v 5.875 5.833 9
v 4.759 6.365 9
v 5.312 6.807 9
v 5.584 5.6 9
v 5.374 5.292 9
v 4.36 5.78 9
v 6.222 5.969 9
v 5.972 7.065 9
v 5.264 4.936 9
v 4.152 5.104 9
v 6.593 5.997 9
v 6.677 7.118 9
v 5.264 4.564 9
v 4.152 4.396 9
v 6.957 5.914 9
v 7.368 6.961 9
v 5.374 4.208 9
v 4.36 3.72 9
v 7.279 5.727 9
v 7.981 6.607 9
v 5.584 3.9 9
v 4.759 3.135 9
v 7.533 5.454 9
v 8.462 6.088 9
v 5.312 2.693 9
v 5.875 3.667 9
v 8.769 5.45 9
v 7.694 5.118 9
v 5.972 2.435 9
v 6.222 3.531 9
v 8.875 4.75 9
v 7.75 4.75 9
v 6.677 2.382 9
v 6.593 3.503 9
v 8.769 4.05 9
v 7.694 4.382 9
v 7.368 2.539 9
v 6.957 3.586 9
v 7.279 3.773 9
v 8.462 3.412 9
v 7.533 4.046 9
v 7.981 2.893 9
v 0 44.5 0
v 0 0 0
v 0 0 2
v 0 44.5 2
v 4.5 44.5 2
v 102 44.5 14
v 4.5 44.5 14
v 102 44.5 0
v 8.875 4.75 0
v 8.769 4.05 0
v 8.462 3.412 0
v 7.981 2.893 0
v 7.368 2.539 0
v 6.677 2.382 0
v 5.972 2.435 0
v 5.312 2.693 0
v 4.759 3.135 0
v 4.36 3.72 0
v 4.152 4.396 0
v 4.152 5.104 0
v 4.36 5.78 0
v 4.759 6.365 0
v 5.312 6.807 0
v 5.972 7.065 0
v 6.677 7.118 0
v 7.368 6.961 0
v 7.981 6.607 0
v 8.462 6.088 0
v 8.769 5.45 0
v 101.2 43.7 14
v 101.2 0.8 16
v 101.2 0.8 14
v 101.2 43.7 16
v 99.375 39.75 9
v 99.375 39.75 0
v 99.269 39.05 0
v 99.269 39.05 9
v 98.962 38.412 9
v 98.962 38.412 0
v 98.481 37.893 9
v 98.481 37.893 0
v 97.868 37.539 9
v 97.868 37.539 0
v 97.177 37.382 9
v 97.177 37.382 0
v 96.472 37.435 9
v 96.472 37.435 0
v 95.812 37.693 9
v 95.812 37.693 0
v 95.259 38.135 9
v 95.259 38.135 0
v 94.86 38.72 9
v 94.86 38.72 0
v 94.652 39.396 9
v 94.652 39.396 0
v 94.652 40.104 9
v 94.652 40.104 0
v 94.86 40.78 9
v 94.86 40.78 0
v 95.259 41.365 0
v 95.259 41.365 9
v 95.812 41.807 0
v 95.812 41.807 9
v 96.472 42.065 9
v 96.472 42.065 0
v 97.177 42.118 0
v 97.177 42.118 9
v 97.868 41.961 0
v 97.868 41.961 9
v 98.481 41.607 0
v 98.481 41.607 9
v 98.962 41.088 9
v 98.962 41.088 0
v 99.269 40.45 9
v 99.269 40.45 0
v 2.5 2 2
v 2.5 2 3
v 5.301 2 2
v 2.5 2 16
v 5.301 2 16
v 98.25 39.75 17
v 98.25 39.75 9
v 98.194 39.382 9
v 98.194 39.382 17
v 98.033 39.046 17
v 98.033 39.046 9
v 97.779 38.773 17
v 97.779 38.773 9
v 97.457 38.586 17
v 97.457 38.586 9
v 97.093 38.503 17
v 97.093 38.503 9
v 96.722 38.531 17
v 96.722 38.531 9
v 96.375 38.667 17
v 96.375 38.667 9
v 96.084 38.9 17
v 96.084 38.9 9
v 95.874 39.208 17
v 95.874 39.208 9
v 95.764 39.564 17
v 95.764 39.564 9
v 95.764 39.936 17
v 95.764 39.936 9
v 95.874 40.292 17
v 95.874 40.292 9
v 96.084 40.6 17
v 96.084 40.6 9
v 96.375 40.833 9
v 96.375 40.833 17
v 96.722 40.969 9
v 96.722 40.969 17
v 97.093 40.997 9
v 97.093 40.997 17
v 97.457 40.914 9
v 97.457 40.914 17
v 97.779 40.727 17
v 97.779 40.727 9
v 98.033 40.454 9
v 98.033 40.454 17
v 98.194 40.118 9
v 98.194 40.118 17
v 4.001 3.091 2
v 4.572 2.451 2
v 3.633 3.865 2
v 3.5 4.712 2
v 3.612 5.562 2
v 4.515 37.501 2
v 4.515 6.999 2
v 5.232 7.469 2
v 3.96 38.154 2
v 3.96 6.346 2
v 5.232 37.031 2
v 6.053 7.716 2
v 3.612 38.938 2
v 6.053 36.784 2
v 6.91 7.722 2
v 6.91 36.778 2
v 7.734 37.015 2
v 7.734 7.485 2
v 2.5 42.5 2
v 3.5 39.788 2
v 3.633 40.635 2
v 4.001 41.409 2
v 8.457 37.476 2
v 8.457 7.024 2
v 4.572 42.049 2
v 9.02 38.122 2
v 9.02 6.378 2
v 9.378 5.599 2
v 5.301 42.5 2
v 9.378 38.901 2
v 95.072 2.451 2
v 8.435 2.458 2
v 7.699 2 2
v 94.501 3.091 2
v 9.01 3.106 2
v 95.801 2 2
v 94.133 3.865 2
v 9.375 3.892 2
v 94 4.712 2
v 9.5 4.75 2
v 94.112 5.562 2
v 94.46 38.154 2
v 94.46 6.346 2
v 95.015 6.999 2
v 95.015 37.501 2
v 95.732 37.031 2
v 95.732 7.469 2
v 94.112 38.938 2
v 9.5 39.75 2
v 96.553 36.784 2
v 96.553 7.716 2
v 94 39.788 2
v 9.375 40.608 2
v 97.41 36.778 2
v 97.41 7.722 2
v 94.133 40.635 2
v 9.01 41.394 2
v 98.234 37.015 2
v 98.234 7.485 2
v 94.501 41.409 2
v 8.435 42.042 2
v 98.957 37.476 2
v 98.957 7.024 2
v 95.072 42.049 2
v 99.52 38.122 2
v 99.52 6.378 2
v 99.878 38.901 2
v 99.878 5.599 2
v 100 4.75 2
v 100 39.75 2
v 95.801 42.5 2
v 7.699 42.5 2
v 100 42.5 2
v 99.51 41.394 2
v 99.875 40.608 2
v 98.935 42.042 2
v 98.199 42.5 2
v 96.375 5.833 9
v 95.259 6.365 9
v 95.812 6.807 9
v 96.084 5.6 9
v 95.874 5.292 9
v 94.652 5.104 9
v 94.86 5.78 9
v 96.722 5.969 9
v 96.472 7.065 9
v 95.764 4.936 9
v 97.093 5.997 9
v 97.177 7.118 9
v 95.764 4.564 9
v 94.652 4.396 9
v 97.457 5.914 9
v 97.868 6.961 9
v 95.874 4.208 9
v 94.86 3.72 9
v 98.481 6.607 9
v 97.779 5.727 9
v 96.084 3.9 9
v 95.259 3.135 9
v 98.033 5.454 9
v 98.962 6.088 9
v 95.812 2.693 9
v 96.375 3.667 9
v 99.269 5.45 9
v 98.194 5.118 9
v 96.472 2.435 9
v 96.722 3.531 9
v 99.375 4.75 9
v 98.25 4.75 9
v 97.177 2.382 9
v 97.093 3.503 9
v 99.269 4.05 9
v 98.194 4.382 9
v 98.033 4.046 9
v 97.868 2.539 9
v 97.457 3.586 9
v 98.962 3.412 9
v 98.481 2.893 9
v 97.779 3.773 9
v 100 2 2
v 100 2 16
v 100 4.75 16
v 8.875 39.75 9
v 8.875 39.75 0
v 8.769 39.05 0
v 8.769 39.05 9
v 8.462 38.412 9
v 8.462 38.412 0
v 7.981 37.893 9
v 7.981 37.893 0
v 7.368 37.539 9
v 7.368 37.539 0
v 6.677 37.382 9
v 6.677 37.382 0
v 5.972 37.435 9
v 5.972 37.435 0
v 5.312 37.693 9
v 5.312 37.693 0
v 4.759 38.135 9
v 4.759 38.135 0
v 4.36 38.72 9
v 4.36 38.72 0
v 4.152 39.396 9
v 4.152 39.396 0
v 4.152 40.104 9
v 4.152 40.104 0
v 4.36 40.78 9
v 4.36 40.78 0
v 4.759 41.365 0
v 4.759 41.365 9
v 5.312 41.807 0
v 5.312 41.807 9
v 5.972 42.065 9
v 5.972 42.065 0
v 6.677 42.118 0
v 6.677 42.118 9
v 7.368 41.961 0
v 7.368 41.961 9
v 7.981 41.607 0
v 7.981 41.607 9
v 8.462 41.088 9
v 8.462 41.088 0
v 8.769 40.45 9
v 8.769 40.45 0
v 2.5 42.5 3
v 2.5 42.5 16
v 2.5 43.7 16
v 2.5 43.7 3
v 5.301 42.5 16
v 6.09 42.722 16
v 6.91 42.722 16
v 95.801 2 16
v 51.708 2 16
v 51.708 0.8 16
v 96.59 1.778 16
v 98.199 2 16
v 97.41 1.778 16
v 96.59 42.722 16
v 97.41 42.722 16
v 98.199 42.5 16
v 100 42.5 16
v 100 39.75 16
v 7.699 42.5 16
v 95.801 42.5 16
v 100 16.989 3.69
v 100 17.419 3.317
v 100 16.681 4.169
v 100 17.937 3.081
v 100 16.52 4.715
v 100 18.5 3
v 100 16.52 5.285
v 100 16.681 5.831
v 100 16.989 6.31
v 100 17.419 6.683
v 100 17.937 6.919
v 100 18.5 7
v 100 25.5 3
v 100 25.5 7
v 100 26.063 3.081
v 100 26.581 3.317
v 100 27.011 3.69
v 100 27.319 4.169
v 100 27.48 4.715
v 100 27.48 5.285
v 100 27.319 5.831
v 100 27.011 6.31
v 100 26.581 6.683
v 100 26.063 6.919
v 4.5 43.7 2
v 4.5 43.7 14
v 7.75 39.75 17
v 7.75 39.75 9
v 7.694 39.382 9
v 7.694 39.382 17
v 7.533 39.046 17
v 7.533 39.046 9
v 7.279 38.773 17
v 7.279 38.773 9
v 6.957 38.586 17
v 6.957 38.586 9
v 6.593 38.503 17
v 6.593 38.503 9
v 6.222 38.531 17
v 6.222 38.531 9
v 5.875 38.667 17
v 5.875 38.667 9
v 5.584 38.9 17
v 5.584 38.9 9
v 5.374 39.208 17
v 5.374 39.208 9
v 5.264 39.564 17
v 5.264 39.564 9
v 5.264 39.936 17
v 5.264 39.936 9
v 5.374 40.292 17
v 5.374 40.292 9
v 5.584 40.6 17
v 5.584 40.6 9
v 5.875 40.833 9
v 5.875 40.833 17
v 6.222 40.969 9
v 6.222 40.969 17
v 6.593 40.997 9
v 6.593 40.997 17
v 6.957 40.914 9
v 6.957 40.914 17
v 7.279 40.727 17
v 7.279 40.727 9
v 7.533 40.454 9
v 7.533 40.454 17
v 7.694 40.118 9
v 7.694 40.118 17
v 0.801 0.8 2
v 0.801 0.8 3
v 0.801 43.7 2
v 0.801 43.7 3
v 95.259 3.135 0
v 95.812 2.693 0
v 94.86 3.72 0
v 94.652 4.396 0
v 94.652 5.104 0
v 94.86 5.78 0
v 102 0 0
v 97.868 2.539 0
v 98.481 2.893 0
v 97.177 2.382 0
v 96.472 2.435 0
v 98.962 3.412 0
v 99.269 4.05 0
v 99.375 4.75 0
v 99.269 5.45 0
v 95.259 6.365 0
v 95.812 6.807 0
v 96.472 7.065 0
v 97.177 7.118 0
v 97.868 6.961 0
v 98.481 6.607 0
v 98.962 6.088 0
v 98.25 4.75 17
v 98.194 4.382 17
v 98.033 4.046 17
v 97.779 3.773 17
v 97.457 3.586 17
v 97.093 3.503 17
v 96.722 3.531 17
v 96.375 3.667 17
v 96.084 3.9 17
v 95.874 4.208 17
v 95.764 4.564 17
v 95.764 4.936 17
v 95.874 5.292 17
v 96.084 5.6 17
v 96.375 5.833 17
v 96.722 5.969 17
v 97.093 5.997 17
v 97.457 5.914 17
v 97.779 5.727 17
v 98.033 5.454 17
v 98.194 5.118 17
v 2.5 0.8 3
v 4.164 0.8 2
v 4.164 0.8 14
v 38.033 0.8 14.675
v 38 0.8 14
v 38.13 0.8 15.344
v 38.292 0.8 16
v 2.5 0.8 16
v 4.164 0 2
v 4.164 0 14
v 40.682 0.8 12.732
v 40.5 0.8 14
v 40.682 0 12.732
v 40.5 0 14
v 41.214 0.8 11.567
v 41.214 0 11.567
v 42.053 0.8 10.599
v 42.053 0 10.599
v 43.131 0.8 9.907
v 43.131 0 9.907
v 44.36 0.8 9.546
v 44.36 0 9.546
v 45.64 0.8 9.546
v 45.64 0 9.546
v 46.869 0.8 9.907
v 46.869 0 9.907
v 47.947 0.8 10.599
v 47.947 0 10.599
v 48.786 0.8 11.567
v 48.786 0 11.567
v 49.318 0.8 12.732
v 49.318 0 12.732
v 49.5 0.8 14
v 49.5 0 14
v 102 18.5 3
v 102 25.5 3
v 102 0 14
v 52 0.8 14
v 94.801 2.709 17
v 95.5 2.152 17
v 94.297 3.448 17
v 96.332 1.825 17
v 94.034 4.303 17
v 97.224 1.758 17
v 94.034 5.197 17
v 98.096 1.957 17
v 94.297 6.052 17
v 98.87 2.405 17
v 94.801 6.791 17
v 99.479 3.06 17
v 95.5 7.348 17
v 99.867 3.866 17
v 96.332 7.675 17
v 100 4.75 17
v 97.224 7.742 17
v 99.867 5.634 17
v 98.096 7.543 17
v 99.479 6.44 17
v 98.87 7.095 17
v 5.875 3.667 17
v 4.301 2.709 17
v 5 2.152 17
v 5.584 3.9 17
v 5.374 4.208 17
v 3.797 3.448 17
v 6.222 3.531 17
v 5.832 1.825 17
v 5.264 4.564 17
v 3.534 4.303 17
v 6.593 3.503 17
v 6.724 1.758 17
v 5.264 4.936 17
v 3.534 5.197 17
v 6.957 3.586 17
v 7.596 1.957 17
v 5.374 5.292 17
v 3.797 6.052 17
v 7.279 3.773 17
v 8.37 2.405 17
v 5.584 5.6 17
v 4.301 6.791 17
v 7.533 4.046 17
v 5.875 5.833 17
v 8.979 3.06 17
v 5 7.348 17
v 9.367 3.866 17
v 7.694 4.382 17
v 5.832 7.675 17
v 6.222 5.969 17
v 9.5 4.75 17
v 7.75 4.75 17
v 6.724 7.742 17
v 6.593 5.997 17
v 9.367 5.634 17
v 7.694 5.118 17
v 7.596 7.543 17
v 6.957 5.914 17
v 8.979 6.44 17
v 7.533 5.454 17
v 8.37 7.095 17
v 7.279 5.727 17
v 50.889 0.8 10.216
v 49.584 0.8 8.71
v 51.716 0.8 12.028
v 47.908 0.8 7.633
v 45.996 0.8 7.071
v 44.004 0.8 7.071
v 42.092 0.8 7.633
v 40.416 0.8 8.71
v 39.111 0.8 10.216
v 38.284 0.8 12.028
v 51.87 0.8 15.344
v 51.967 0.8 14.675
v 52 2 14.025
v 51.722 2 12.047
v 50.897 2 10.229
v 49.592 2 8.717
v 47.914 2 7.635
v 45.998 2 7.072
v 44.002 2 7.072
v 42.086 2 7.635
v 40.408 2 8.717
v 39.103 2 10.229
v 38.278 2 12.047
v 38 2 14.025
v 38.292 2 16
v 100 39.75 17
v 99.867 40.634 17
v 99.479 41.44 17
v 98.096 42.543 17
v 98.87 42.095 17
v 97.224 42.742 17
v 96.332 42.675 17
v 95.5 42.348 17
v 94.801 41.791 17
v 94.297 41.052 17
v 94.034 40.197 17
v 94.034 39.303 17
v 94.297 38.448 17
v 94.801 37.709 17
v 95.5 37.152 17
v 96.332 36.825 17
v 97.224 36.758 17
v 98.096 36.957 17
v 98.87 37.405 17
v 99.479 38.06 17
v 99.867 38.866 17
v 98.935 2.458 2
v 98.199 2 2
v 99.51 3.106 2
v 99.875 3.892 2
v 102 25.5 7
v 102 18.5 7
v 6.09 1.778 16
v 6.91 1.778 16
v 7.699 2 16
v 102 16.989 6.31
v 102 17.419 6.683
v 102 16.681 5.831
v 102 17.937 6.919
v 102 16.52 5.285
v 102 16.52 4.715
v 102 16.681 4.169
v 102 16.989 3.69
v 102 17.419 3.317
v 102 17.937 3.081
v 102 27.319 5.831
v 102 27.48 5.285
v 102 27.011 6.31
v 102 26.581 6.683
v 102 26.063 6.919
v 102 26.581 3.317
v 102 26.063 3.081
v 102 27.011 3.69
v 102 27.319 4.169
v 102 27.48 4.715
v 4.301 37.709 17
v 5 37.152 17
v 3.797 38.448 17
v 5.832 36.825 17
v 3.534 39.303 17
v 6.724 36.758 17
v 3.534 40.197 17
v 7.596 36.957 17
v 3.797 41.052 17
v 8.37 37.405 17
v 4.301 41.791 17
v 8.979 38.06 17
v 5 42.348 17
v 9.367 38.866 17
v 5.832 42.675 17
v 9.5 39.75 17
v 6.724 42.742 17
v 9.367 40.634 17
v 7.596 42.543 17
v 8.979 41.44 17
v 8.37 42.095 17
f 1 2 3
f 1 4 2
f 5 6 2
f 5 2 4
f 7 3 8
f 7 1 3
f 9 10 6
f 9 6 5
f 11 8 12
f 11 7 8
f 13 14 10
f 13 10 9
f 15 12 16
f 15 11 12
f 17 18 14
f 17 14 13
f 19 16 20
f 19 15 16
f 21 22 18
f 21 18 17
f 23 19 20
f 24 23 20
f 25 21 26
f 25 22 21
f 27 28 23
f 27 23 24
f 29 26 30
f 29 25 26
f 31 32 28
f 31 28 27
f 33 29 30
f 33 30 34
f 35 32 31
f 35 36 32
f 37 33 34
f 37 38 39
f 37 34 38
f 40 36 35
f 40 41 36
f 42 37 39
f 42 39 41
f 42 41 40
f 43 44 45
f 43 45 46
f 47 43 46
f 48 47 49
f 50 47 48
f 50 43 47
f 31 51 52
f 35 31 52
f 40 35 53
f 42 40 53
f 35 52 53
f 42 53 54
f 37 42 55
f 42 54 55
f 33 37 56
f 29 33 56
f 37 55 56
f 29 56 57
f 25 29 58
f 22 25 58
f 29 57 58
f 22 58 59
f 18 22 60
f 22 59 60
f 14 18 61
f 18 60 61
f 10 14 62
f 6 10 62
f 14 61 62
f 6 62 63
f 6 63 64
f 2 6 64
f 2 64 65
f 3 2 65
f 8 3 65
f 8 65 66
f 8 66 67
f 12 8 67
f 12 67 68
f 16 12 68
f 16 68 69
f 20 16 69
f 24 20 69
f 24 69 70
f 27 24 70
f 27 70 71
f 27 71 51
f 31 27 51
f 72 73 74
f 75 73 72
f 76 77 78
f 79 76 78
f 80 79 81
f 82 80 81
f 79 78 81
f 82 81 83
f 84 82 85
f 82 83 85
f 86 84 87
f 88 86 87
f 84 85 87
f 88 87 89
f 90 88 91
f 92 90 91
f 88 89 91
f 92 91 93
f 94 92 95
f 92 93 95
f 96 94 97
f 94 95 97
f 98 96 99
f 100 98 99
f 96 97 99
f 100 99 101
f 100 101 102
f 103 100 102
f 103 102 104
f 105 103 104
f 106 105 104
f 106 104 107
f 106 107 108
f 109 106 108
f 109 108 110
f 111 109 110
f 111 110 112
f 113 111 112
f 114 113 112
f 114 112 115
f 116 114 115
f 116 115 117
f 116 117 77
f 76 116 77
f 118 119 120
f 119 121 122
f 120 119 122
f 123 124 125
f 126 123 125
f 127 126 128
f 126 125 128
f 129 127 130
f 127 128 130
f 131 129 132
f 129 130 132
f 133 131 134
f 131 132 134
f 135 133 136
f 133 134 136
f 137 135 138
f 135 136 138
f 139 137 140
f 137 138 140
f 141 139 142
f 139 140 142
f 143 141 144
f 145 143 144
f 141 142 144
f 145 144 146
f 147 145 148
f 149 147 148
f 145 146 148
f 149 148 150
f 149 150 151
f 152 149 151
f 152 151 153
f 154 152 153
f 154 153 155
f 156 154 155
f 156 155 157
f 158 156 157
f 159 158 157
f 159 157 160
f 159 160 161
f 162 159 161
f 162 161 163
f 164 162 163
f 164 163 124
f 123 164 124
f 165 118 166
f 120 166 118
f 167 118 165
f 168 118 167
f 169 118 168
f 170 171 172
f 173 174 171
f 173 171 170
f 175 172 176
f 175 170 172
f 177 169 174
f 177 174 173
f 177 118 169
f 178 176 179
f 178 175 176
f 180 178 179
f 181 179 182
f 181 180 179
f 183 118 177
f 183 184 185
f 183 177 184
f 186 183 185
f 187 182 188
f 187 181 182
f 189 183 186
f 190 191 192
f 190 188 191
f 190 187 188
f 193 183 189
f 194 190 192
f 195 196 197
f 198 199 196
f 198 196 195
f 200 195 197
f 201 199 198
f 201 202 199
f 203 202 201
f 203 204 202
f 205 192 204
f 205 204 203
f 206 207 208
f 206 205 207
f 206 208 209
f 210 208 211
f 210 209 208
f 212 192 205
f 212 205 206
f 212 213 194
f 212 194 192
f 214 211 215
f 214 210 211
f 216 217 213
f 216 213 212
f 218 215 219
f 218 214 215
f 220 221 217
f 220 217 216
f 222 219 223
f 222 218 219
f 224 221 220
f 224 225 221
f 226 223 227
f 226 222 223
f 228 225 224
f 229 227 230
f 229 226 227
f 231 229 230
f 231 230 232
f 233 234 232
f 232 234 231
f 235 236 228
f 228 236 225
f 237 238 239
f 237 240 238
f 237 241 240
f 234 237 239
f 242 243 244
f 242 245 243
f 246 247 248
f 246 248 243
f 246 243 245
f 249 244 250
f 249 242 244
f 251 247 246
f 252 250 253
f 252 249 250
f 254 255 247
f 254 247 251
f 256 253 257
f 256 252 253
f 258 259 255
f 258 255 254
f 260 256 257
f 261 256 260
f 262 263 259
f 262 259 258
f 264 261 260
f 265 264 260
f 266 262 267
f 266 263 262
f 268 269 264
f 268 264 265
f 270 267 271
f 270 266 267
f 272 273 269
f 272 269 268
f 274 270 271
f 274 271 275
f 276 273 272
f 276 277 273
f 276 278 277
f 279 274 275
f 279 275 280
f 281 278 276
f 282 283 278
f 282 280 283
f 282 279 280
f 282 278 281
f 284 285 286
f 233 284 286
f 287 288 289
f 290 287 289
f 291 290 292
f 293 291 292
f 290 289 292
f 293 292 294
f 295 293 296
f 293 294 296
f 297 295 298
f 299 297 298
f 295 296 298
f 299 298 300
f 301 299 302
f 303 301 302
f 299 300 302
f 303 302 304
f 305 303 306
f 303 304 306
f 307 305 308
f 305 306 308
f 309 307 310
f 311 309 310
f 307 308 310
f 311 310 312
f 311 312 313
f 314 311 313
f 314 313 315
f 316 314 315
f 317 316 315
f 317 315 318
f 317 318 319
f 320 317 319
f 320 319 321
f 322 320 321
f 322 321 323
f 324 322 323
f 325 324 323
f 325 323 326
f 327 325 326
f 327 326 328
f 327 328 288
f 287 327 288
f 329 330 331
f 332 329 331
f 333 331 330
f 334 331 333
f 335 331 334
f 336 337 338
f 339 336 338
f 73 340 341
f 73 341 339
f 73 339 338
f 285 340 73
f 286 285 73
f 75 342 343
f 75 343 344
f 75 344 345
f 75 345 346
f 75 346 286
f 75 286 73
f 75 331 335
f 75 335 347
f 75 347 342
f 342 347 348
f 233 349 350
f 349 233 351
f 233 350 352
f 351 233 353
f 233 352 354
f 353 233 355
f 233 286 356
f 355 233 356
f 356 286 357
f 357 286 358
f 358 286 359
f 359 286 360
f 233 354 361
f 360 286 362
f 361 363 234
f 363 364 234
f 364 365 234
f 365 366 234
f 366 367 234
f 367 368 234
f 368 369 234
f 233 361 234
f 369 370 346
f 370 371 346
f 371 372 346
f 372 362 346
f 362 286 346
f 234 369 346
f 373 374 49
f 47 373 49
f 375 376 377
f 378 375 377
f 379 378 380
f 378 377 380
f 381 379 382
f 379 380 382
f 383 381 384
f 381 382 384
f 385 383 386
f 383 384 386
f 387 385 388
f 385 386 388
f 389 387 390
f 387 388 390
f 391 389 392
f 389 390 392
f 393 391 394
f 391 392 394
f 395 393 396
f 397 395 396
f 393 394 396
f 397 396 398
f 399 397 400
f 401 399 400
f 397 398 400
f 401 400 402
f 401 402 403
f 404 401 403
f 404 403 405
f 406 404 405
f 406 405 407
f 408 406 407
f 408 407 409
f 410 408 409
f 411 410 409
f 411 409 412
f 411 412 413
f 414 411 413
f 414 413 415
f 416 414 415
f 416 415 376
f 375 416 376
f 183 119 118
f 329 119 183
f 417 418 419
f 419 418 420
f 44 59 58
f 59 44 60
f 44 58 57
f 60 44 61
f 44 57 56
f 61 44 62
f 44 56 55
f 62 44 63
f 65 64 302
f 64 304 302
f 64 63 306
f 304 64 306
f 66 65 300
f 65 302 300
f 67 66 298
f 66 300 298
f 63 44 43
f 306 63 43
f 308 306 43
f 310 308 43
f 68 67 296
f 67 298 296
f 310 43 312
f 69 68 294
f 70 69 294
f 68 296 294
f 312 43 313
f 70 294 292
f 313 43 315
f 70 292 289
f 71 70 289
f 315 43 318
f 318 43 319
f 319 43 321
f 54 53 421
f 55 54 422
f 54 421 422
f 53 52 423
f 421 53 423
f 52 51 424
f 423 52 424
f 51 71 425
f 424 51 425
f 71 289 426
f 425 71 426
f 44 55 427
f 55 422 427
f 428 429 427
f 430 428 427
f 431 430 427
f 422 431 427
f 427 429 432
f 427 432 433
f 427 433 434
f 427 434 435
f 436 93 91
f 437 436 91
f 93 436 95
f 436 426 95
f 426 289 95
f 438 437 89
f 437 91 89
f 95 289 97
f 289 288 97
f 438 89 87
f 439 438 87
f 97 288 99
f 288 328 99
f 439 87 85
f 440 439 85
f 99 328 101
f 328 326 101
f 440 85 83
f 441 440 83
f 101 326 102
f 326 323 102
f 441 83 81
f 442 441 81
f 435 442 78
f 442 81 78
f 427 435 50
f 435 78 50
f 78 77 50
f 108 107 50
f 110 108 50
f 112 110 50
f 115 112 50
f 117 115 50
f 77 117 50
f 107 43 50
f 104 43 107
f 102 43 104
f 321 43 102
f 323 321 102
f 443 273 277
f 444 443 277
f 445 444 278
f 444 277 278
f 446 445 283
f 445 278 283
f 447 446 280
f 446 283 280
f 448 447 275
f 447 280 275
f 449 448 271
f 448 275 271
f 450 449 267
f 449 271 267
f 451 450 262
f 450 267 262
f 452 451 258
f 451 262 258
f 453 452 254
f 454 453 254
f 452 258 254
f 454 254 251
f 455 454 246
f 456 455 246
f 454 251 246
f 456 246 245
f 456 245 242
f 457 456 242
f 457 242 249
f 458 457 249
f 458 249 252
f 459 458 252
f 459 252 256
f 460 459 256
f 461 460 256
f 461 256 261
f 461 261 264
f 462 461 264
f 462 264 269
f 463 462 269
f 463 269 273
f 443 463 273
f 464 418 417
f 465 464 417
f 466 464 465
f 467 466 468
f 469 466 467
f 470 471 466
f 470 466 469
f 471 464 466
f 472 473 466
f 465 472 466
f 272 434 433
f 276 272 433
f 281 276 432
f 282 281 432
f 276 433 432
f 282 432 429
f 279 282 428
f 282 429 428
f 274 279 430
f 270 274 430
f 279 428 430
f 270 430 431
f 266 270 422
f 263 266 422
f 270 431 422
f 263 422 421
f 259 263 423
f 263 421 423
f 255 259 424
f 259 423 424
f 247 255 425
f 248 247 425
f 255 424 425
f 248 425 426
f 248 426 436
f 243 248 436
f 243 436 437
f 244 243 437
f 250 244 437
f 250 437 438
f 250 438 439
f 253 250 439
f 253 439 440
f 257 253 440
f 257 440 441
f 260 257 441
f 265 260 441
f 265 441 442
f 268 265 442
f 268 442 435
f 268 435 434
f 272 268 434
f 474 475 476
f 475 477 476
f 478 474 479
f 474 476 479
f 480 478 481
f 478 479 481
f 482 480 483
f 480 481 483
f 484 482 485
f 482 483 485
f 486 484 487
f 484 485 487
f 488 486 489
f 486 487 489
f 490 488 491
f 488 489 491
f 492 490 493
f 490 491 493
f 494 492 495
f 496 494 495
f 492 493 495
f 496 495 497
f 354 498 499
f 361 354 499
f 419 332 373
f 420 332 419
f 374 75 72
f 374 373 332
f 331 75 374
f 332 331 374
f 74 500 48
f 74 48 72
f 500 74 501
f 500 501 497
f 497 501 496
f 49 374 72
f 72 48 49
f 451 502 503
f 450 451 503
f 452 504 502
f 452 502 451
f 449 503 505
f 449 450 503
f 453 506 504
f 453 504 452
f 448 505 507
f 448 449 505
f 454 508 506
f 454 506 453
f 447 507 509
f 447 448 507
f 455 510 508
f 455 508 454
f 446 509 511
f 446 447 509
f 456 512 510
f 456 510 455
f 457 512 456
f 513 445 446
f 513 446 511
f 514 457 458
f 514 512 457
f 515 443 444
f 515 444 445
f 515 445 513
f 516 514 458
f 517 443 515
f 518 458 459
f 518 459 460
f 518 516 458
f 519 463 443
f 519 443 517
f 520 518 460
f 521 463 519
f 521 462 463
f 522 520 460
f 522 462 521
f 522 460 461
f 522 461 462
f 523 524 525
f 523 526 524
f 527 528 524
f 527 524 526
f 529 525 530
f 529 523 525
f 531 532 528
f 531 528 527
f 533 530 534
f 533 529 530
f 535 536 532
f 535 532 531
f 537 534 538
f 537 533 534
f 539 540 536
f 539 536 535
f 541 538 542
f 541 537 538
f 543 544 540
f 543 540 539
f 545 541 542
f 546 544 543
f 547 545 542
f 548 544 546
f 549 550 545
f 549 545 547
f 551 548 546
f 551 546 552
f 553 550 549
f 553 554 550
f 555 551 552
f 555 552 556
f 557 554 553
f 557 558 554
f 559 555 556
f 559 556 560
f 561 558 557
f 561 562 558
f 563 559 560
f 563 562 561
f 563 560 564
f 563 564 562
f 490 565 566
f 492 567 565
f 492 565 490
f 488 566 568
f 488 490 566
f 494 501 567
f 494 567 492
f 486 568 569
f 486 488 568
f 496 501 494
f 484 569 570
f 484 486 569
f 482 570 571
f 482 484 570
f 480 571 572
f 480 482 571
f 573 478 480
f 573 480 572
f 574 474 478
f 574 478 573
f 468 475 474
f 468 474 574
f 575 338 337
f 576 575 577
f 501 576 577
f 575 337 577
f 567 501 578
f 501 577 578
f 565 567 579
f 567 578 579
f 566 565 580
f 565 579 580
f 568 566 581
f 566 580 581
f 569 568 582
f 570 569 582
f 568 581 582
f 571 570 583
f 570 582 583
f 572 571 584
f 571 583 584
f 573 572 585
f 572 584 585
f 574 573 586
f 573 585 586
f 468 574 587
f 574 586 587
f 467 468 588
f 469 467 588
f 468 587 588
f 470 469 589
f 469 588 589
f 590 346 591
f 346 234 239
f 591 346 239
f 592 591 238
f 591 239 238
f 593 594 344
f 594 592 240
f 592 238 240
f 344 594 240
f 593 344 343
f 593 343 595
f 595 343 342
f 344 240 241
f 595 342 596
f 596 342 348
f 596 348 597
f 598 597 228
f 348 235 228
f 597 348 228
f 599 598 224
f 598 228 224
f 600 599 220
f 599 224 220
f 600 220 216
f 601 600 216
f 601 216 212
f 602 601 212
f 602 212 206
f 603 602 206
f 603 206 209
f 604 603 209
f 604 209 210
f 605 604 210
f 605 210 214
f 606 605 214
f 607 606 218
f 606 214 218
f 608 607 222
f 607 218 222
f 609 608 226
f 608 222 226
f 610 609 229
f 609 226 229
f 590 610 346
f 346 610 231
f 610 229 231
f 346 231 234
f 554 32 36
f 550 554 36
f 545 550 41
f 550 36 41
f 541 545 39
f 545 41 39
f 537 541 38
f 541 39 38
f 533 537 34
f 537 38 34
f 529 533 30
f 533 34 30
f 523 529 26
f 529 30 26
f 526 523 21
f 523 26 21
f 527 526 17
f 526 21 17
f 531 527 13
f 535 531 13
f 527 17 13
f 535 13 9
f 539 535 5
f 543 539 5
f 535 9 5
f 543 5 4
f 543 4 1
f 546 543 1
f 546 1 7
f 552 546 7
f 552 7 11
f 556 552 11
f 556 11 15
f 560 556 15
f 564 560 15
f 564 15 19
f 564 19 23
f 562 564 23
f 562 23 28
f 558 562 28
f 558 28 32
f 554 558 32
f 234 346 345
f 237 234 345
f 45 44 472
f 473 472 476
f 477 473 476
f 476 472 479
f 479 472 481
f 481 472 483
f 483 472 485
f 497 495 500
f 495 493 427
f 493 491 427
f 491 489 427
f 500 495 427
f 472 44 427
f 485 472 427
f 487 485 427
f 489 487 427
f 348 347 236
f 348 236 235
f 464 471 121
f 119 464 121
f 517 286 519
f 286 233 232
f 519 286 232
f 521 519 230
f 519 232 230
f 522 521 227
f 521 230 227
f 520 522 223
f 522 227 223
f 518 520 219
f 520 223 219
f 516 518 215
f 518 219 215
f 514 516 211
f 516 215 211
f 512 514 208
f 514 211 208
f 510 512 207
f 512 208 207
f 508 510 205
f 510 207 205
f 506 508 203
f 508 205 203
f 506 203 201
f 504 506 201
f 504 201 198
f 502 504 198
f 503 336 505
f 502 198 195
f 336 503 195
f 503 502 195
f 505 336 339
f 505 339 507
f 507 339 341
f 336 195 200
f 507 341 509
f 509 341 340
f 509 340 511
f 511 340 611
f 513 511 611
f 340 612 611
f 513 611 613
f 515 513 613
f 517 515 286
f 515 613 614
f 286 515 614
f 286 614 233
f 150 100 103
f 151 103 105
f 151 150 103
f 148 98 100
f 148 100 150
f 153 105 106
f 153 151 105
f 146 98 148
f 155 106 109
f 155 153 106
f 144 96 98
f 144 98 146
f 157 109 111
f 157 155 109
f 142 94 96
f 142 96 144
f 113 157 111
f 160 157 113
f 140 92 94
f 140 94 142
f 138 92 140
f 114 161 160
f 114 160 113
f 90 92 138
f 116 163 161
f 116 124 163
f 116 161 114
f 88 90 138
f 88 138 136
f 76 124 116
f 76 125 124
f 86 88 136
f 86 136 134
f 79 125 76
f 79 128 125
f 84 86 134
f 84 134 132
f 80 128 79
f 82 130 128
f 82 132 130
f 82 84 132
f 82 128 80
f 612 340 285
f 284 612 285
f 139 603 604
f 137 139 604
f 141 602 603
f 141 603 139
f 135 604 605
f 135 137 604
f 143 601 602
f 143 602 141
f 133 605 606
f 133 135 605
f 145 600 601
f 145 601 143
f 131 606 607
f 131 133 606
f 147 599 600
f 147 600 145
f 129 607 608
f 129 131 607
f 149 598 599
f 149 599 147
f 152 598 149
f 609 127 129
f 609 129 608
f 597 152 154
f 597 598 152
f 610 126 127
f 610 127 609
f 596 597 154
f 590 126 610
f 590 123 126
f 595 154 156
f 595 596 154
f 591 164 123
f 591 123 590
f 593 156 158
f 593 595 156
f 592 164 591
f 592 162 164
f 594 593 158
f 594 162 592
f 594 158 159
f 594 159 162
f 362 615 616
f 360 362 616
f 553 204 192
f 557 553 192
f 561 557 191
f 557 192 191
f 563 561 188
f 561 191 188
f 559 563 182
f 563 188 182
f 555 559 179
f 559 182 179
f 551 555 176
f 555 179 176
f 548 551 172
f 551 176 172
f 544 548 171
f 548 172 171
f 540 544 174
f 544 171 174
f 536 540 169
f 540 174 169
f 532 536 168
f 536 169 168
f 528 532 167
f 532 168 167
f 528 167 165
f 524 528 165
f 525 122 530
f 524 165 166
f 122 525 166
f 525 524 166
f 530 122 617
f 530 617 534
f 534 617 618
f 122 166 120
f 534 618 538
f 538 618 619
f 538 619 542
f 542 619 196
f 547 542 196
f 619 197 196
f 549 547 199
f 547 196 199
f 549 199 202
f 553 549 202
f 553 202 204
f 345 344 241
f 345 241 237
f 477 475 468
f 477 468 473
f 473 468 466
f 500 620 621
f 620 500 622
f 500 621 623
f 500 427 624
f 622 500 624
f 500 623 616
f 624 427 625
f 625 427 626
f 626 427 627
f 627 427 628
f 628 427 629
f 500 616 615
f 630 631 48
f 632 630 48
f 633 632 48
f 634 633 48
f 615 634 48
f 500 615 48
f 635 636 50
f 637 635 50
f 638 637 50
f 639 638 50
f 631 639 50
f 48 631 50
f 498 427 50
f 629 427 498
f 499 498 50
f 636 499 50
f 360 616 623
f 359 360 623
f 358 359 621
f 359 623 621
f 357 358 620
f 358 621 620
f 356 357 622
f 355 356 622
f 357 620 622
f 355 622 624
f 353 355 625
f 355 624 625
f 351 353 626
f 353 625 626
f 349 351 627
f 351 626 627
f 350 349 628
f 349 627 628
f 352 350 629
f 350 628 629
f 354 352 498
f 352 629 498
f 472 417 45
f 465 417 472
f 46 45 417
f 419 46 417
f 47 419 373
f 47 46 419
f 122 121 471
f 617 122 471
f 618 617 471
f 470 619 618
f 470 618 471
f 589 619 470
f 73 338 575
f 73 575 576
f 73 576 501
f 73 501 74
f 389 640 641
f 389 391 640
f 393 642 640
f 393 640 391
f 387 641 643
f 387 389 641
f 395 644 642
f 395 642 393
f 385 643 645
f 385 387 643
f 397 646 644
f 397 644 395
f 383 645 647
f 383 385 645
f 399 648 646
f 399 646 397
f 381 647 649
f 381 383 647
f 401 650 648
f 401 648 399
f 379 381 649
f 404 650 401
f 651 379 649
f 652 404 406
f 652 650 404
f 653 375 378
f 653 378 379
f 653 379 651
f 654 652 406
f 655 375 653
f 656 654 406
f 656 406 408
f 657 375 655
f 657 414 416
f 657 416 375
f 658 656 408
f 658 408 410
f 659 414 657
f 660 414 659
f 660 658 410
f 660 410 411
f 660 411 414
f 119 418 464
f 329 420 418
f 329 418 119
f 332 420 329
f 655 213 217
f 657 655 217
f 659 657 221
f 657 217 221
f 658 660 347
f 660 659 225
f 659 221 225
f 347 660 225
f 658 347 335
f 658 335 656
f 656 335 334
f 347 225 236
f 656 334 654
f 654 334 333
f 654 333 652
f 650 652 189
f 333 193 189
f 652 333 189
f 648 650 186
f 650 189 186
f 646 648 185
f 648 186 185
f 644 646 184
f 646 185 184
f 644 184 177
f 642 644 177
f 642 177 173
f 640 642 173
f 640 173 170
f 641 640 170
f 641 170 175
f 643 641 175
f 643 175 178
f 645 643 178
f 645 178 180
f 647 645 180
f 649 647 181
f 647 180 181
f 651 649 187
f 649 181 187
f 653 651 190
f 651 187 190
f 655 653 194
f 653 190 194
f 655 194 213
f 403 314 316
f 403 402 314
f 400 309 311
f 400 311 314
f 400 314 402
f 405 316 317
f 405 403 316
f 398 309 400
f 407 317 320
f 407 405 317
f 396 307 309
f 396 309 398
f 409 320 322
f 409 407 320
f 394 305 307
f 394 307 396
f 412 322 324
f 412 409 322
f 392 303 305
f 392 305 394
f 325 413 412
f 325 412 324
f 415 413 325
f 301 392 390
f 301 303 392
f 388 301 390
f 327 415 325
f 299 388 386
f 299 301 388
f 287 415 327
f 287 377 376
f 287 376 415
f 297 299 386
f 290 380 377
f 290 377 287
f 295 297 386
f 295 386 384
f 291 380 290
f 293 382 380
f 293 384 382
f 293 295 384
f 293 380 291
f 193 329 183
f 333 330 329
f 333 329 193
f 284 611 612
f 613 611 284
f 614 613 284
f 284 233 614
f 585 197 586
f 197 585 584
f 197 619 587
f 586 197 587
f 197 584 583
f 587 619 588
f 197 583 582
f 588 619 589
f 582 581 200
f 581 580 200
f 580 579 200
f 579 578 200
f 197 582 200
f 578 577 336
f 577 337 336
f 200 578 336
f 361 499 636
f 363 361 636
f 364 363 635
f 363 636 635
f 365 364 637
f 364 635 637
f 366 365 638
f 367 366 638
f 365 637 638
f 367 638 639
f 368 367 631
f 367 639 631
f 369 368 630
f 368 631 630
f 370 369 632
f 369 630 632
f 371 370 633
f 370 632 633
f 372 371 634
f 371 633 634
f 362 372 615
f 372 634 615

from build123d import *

# Parameters (mm, degrees)
SKETCH_W        = 102
SKETCH_H        = 44.5
PAD_DEPTH       = 16
SKETCH001_W     = 97.5
SKETCH001_H     = 40.5
POCKET_DEPTH    = 14
SKETCH002_R     = 3
PAD001_DEPTH    = 15
SKETCH007_R     = 1.25
POCKET004_DEPTH = 35
SKETCH008_R     = 2.375
POCKET005_DEPTH = 27
POCKET008_DEPTH = 5
SKETCH012_R     = 4.5
POCKET009_DEPTH = 10
SKETCH013_R     = 7
POCKET010_DEPTH = 1.2
SKETCH022_W     = 2.5
SKETCH022_H     = 44.5
POCKET018_DEPTH = 13
POCKET019_DEPTH = 2
POCKET020_DEPTH = 14


with BuildPart() as part:
    # Sketch → Pad (new body)
    with BuildSketch(Plane.XY):
        with Locations((51, 22.25)):
            Rectangle(SKETCH_W, SKETCH_H)
    extrude(amount=PAD_DEPTH)

    # Sketch001 (on Face6 of Pad) → Pocket (cut)
    with BuildSketch(Plane.XY.offset(16)):
        with Locations((51.25, 22.25)):
            Rectangle(SKETCH001_W, SKETCH001_H)
    extrude(amount=-POCKET_DEPTH, mode=Mode.SUBTRACT)

    # Sketch002 (on Face11 of Pocket) → Pad001 (join)
    with BuildSketch(Plane.XY.offset(2)):
        with Locations((6.5, 39.75)):
            Circle(SKETCH002_R)
        with Locations((97, 39.75)):
            Circle(SKETCH002_R)
        with Locations((6.5, 4.75)):
            Circle(SKETCH002_R)
        with Locations((97, 4.75)):
            Circle(SKETCH002_R)
    extrude(amount=PAD001_DEPTH)

    # Sketch007 (on DatumPlane) → Pocket004 (cut)
    with BuildSketch(Plane(origin=(0, 0, -18), x_dir=(1, 0, 0), z_dir=(0, 0, -1))):
        with Locations((6.5, -4.75)):
            Circle(SKETCH007_R)
        with Locations((97, -4.75)):
            Circle(SKETCH007_R)
        with Locations((6.5, -39.75)):
            Circle(SKETCH007_R)
        with Locations((97, -39.75)):
            Circle(SKETCH007_R)
    extrude(amount=-POCKET004_DEPTH, mode=Mode.SUBTRACT)

    # Sketch008 (on DatumPlane) → Pocket005 (cut)
    with BuildSketch(Plane(origin=(0, 0, -18), x_dir=(1, 0, 0), z_dir=(0, 0, -1))):
        with Locations((6.5, -4.75)):
            Circle(SKETCH008_R)
        with Locations((97, -4.75)):
            Circle(SKETCH008_R)
        with Locations((6.5, -39.75)):
            Circle(SKETCH008_R)
        with Locations((97, -39.75)):
            Circle(SKETCH008_R)
    extrude(amount=-POCKET005_DEPTH, mode=Mode.SUBTRACT)

    # Sketch011 → Pocket008 (cut)
    with BuildSketch(Plane.YZ.offset(102)):
        with BuildLine():
            ThreePointArc((18.5, 7), (16.5, 5), (18.5, 3))
            Line((18.5, 3), (25.5, 3))
            ThreePointArc((25.5, 3), (27.5, 5), (25.5, 7))
            Line((25.5, 7), (18.5, 7))
        make_face()
    extrude(amount=-POCKET008_DEPTH, mode=Mode.SUBTRACT)

    # Sketch012 (on Face1 of Pocket008) → Pocket009 (cut)
    with BuildSketch(Plane.XZ):
        with Locations((45, 14)):
            Circle(SKETCH012_R)
    extrude(amount=-POCKET009_DEPTH, mode=Mode.SUBTRACT)

    # Sketch013 (on Face17 of Pocket009) → Pocket010 (cut)
    with BuildSketch(Plane(origin=(0, 2, 0), x_dir=(-1, 0, 0), z_dir=(0, 1, 0))):
        with Locations((-45, 14)):
            Circle(SKETCH013_R)
    extrude(amount=-POCKET010_DEPTH, mode=Mode.SUBTRACT)

    # Sketch022 → Pocket018 (cut)
    with BuildSketch(Plane.XY.offset(16)):
        with Locations((1.25, 22.25)):
            Rectangle(SKETCH022_W, SKETCH022_H)
    extrude(amount=-POCKET018_DEPTH, mode=Mode.SUBTRACT)

    # Sketch023 (on Face4 of Pocket018) → Pocket019 (cut)
    with BuildSketch(Plane.XY.offset(16)):
        Polygon((2.499048, 44.5), (102, 44.5), (102, 0), (2.5, 0), (2.5, 0.8), (101.2, 0.8), (101.2, 43.7), (2.499048, 43.7), align=None)
    extrude(amount=-POCKET019_DEPTH, mode=Mode.SUBTRACT)

    # Sketch024 (on Face25 of Pocket019) → Pocket020 (cut)
    with BuildSketch(Plane.XY.offset(16)):
        Polygon((4.163707, 0), (4.163707, 0.8), (0.800622, 0.8), (0.800622, 43.7), (4.5, 43.7), (4.5, 44.5), (0, 44.5), (0, 0), align=None)
    extrude(amount=-POCKET020_DEPTH, mode=Mode.SUBTRACT)


solid = part.part
